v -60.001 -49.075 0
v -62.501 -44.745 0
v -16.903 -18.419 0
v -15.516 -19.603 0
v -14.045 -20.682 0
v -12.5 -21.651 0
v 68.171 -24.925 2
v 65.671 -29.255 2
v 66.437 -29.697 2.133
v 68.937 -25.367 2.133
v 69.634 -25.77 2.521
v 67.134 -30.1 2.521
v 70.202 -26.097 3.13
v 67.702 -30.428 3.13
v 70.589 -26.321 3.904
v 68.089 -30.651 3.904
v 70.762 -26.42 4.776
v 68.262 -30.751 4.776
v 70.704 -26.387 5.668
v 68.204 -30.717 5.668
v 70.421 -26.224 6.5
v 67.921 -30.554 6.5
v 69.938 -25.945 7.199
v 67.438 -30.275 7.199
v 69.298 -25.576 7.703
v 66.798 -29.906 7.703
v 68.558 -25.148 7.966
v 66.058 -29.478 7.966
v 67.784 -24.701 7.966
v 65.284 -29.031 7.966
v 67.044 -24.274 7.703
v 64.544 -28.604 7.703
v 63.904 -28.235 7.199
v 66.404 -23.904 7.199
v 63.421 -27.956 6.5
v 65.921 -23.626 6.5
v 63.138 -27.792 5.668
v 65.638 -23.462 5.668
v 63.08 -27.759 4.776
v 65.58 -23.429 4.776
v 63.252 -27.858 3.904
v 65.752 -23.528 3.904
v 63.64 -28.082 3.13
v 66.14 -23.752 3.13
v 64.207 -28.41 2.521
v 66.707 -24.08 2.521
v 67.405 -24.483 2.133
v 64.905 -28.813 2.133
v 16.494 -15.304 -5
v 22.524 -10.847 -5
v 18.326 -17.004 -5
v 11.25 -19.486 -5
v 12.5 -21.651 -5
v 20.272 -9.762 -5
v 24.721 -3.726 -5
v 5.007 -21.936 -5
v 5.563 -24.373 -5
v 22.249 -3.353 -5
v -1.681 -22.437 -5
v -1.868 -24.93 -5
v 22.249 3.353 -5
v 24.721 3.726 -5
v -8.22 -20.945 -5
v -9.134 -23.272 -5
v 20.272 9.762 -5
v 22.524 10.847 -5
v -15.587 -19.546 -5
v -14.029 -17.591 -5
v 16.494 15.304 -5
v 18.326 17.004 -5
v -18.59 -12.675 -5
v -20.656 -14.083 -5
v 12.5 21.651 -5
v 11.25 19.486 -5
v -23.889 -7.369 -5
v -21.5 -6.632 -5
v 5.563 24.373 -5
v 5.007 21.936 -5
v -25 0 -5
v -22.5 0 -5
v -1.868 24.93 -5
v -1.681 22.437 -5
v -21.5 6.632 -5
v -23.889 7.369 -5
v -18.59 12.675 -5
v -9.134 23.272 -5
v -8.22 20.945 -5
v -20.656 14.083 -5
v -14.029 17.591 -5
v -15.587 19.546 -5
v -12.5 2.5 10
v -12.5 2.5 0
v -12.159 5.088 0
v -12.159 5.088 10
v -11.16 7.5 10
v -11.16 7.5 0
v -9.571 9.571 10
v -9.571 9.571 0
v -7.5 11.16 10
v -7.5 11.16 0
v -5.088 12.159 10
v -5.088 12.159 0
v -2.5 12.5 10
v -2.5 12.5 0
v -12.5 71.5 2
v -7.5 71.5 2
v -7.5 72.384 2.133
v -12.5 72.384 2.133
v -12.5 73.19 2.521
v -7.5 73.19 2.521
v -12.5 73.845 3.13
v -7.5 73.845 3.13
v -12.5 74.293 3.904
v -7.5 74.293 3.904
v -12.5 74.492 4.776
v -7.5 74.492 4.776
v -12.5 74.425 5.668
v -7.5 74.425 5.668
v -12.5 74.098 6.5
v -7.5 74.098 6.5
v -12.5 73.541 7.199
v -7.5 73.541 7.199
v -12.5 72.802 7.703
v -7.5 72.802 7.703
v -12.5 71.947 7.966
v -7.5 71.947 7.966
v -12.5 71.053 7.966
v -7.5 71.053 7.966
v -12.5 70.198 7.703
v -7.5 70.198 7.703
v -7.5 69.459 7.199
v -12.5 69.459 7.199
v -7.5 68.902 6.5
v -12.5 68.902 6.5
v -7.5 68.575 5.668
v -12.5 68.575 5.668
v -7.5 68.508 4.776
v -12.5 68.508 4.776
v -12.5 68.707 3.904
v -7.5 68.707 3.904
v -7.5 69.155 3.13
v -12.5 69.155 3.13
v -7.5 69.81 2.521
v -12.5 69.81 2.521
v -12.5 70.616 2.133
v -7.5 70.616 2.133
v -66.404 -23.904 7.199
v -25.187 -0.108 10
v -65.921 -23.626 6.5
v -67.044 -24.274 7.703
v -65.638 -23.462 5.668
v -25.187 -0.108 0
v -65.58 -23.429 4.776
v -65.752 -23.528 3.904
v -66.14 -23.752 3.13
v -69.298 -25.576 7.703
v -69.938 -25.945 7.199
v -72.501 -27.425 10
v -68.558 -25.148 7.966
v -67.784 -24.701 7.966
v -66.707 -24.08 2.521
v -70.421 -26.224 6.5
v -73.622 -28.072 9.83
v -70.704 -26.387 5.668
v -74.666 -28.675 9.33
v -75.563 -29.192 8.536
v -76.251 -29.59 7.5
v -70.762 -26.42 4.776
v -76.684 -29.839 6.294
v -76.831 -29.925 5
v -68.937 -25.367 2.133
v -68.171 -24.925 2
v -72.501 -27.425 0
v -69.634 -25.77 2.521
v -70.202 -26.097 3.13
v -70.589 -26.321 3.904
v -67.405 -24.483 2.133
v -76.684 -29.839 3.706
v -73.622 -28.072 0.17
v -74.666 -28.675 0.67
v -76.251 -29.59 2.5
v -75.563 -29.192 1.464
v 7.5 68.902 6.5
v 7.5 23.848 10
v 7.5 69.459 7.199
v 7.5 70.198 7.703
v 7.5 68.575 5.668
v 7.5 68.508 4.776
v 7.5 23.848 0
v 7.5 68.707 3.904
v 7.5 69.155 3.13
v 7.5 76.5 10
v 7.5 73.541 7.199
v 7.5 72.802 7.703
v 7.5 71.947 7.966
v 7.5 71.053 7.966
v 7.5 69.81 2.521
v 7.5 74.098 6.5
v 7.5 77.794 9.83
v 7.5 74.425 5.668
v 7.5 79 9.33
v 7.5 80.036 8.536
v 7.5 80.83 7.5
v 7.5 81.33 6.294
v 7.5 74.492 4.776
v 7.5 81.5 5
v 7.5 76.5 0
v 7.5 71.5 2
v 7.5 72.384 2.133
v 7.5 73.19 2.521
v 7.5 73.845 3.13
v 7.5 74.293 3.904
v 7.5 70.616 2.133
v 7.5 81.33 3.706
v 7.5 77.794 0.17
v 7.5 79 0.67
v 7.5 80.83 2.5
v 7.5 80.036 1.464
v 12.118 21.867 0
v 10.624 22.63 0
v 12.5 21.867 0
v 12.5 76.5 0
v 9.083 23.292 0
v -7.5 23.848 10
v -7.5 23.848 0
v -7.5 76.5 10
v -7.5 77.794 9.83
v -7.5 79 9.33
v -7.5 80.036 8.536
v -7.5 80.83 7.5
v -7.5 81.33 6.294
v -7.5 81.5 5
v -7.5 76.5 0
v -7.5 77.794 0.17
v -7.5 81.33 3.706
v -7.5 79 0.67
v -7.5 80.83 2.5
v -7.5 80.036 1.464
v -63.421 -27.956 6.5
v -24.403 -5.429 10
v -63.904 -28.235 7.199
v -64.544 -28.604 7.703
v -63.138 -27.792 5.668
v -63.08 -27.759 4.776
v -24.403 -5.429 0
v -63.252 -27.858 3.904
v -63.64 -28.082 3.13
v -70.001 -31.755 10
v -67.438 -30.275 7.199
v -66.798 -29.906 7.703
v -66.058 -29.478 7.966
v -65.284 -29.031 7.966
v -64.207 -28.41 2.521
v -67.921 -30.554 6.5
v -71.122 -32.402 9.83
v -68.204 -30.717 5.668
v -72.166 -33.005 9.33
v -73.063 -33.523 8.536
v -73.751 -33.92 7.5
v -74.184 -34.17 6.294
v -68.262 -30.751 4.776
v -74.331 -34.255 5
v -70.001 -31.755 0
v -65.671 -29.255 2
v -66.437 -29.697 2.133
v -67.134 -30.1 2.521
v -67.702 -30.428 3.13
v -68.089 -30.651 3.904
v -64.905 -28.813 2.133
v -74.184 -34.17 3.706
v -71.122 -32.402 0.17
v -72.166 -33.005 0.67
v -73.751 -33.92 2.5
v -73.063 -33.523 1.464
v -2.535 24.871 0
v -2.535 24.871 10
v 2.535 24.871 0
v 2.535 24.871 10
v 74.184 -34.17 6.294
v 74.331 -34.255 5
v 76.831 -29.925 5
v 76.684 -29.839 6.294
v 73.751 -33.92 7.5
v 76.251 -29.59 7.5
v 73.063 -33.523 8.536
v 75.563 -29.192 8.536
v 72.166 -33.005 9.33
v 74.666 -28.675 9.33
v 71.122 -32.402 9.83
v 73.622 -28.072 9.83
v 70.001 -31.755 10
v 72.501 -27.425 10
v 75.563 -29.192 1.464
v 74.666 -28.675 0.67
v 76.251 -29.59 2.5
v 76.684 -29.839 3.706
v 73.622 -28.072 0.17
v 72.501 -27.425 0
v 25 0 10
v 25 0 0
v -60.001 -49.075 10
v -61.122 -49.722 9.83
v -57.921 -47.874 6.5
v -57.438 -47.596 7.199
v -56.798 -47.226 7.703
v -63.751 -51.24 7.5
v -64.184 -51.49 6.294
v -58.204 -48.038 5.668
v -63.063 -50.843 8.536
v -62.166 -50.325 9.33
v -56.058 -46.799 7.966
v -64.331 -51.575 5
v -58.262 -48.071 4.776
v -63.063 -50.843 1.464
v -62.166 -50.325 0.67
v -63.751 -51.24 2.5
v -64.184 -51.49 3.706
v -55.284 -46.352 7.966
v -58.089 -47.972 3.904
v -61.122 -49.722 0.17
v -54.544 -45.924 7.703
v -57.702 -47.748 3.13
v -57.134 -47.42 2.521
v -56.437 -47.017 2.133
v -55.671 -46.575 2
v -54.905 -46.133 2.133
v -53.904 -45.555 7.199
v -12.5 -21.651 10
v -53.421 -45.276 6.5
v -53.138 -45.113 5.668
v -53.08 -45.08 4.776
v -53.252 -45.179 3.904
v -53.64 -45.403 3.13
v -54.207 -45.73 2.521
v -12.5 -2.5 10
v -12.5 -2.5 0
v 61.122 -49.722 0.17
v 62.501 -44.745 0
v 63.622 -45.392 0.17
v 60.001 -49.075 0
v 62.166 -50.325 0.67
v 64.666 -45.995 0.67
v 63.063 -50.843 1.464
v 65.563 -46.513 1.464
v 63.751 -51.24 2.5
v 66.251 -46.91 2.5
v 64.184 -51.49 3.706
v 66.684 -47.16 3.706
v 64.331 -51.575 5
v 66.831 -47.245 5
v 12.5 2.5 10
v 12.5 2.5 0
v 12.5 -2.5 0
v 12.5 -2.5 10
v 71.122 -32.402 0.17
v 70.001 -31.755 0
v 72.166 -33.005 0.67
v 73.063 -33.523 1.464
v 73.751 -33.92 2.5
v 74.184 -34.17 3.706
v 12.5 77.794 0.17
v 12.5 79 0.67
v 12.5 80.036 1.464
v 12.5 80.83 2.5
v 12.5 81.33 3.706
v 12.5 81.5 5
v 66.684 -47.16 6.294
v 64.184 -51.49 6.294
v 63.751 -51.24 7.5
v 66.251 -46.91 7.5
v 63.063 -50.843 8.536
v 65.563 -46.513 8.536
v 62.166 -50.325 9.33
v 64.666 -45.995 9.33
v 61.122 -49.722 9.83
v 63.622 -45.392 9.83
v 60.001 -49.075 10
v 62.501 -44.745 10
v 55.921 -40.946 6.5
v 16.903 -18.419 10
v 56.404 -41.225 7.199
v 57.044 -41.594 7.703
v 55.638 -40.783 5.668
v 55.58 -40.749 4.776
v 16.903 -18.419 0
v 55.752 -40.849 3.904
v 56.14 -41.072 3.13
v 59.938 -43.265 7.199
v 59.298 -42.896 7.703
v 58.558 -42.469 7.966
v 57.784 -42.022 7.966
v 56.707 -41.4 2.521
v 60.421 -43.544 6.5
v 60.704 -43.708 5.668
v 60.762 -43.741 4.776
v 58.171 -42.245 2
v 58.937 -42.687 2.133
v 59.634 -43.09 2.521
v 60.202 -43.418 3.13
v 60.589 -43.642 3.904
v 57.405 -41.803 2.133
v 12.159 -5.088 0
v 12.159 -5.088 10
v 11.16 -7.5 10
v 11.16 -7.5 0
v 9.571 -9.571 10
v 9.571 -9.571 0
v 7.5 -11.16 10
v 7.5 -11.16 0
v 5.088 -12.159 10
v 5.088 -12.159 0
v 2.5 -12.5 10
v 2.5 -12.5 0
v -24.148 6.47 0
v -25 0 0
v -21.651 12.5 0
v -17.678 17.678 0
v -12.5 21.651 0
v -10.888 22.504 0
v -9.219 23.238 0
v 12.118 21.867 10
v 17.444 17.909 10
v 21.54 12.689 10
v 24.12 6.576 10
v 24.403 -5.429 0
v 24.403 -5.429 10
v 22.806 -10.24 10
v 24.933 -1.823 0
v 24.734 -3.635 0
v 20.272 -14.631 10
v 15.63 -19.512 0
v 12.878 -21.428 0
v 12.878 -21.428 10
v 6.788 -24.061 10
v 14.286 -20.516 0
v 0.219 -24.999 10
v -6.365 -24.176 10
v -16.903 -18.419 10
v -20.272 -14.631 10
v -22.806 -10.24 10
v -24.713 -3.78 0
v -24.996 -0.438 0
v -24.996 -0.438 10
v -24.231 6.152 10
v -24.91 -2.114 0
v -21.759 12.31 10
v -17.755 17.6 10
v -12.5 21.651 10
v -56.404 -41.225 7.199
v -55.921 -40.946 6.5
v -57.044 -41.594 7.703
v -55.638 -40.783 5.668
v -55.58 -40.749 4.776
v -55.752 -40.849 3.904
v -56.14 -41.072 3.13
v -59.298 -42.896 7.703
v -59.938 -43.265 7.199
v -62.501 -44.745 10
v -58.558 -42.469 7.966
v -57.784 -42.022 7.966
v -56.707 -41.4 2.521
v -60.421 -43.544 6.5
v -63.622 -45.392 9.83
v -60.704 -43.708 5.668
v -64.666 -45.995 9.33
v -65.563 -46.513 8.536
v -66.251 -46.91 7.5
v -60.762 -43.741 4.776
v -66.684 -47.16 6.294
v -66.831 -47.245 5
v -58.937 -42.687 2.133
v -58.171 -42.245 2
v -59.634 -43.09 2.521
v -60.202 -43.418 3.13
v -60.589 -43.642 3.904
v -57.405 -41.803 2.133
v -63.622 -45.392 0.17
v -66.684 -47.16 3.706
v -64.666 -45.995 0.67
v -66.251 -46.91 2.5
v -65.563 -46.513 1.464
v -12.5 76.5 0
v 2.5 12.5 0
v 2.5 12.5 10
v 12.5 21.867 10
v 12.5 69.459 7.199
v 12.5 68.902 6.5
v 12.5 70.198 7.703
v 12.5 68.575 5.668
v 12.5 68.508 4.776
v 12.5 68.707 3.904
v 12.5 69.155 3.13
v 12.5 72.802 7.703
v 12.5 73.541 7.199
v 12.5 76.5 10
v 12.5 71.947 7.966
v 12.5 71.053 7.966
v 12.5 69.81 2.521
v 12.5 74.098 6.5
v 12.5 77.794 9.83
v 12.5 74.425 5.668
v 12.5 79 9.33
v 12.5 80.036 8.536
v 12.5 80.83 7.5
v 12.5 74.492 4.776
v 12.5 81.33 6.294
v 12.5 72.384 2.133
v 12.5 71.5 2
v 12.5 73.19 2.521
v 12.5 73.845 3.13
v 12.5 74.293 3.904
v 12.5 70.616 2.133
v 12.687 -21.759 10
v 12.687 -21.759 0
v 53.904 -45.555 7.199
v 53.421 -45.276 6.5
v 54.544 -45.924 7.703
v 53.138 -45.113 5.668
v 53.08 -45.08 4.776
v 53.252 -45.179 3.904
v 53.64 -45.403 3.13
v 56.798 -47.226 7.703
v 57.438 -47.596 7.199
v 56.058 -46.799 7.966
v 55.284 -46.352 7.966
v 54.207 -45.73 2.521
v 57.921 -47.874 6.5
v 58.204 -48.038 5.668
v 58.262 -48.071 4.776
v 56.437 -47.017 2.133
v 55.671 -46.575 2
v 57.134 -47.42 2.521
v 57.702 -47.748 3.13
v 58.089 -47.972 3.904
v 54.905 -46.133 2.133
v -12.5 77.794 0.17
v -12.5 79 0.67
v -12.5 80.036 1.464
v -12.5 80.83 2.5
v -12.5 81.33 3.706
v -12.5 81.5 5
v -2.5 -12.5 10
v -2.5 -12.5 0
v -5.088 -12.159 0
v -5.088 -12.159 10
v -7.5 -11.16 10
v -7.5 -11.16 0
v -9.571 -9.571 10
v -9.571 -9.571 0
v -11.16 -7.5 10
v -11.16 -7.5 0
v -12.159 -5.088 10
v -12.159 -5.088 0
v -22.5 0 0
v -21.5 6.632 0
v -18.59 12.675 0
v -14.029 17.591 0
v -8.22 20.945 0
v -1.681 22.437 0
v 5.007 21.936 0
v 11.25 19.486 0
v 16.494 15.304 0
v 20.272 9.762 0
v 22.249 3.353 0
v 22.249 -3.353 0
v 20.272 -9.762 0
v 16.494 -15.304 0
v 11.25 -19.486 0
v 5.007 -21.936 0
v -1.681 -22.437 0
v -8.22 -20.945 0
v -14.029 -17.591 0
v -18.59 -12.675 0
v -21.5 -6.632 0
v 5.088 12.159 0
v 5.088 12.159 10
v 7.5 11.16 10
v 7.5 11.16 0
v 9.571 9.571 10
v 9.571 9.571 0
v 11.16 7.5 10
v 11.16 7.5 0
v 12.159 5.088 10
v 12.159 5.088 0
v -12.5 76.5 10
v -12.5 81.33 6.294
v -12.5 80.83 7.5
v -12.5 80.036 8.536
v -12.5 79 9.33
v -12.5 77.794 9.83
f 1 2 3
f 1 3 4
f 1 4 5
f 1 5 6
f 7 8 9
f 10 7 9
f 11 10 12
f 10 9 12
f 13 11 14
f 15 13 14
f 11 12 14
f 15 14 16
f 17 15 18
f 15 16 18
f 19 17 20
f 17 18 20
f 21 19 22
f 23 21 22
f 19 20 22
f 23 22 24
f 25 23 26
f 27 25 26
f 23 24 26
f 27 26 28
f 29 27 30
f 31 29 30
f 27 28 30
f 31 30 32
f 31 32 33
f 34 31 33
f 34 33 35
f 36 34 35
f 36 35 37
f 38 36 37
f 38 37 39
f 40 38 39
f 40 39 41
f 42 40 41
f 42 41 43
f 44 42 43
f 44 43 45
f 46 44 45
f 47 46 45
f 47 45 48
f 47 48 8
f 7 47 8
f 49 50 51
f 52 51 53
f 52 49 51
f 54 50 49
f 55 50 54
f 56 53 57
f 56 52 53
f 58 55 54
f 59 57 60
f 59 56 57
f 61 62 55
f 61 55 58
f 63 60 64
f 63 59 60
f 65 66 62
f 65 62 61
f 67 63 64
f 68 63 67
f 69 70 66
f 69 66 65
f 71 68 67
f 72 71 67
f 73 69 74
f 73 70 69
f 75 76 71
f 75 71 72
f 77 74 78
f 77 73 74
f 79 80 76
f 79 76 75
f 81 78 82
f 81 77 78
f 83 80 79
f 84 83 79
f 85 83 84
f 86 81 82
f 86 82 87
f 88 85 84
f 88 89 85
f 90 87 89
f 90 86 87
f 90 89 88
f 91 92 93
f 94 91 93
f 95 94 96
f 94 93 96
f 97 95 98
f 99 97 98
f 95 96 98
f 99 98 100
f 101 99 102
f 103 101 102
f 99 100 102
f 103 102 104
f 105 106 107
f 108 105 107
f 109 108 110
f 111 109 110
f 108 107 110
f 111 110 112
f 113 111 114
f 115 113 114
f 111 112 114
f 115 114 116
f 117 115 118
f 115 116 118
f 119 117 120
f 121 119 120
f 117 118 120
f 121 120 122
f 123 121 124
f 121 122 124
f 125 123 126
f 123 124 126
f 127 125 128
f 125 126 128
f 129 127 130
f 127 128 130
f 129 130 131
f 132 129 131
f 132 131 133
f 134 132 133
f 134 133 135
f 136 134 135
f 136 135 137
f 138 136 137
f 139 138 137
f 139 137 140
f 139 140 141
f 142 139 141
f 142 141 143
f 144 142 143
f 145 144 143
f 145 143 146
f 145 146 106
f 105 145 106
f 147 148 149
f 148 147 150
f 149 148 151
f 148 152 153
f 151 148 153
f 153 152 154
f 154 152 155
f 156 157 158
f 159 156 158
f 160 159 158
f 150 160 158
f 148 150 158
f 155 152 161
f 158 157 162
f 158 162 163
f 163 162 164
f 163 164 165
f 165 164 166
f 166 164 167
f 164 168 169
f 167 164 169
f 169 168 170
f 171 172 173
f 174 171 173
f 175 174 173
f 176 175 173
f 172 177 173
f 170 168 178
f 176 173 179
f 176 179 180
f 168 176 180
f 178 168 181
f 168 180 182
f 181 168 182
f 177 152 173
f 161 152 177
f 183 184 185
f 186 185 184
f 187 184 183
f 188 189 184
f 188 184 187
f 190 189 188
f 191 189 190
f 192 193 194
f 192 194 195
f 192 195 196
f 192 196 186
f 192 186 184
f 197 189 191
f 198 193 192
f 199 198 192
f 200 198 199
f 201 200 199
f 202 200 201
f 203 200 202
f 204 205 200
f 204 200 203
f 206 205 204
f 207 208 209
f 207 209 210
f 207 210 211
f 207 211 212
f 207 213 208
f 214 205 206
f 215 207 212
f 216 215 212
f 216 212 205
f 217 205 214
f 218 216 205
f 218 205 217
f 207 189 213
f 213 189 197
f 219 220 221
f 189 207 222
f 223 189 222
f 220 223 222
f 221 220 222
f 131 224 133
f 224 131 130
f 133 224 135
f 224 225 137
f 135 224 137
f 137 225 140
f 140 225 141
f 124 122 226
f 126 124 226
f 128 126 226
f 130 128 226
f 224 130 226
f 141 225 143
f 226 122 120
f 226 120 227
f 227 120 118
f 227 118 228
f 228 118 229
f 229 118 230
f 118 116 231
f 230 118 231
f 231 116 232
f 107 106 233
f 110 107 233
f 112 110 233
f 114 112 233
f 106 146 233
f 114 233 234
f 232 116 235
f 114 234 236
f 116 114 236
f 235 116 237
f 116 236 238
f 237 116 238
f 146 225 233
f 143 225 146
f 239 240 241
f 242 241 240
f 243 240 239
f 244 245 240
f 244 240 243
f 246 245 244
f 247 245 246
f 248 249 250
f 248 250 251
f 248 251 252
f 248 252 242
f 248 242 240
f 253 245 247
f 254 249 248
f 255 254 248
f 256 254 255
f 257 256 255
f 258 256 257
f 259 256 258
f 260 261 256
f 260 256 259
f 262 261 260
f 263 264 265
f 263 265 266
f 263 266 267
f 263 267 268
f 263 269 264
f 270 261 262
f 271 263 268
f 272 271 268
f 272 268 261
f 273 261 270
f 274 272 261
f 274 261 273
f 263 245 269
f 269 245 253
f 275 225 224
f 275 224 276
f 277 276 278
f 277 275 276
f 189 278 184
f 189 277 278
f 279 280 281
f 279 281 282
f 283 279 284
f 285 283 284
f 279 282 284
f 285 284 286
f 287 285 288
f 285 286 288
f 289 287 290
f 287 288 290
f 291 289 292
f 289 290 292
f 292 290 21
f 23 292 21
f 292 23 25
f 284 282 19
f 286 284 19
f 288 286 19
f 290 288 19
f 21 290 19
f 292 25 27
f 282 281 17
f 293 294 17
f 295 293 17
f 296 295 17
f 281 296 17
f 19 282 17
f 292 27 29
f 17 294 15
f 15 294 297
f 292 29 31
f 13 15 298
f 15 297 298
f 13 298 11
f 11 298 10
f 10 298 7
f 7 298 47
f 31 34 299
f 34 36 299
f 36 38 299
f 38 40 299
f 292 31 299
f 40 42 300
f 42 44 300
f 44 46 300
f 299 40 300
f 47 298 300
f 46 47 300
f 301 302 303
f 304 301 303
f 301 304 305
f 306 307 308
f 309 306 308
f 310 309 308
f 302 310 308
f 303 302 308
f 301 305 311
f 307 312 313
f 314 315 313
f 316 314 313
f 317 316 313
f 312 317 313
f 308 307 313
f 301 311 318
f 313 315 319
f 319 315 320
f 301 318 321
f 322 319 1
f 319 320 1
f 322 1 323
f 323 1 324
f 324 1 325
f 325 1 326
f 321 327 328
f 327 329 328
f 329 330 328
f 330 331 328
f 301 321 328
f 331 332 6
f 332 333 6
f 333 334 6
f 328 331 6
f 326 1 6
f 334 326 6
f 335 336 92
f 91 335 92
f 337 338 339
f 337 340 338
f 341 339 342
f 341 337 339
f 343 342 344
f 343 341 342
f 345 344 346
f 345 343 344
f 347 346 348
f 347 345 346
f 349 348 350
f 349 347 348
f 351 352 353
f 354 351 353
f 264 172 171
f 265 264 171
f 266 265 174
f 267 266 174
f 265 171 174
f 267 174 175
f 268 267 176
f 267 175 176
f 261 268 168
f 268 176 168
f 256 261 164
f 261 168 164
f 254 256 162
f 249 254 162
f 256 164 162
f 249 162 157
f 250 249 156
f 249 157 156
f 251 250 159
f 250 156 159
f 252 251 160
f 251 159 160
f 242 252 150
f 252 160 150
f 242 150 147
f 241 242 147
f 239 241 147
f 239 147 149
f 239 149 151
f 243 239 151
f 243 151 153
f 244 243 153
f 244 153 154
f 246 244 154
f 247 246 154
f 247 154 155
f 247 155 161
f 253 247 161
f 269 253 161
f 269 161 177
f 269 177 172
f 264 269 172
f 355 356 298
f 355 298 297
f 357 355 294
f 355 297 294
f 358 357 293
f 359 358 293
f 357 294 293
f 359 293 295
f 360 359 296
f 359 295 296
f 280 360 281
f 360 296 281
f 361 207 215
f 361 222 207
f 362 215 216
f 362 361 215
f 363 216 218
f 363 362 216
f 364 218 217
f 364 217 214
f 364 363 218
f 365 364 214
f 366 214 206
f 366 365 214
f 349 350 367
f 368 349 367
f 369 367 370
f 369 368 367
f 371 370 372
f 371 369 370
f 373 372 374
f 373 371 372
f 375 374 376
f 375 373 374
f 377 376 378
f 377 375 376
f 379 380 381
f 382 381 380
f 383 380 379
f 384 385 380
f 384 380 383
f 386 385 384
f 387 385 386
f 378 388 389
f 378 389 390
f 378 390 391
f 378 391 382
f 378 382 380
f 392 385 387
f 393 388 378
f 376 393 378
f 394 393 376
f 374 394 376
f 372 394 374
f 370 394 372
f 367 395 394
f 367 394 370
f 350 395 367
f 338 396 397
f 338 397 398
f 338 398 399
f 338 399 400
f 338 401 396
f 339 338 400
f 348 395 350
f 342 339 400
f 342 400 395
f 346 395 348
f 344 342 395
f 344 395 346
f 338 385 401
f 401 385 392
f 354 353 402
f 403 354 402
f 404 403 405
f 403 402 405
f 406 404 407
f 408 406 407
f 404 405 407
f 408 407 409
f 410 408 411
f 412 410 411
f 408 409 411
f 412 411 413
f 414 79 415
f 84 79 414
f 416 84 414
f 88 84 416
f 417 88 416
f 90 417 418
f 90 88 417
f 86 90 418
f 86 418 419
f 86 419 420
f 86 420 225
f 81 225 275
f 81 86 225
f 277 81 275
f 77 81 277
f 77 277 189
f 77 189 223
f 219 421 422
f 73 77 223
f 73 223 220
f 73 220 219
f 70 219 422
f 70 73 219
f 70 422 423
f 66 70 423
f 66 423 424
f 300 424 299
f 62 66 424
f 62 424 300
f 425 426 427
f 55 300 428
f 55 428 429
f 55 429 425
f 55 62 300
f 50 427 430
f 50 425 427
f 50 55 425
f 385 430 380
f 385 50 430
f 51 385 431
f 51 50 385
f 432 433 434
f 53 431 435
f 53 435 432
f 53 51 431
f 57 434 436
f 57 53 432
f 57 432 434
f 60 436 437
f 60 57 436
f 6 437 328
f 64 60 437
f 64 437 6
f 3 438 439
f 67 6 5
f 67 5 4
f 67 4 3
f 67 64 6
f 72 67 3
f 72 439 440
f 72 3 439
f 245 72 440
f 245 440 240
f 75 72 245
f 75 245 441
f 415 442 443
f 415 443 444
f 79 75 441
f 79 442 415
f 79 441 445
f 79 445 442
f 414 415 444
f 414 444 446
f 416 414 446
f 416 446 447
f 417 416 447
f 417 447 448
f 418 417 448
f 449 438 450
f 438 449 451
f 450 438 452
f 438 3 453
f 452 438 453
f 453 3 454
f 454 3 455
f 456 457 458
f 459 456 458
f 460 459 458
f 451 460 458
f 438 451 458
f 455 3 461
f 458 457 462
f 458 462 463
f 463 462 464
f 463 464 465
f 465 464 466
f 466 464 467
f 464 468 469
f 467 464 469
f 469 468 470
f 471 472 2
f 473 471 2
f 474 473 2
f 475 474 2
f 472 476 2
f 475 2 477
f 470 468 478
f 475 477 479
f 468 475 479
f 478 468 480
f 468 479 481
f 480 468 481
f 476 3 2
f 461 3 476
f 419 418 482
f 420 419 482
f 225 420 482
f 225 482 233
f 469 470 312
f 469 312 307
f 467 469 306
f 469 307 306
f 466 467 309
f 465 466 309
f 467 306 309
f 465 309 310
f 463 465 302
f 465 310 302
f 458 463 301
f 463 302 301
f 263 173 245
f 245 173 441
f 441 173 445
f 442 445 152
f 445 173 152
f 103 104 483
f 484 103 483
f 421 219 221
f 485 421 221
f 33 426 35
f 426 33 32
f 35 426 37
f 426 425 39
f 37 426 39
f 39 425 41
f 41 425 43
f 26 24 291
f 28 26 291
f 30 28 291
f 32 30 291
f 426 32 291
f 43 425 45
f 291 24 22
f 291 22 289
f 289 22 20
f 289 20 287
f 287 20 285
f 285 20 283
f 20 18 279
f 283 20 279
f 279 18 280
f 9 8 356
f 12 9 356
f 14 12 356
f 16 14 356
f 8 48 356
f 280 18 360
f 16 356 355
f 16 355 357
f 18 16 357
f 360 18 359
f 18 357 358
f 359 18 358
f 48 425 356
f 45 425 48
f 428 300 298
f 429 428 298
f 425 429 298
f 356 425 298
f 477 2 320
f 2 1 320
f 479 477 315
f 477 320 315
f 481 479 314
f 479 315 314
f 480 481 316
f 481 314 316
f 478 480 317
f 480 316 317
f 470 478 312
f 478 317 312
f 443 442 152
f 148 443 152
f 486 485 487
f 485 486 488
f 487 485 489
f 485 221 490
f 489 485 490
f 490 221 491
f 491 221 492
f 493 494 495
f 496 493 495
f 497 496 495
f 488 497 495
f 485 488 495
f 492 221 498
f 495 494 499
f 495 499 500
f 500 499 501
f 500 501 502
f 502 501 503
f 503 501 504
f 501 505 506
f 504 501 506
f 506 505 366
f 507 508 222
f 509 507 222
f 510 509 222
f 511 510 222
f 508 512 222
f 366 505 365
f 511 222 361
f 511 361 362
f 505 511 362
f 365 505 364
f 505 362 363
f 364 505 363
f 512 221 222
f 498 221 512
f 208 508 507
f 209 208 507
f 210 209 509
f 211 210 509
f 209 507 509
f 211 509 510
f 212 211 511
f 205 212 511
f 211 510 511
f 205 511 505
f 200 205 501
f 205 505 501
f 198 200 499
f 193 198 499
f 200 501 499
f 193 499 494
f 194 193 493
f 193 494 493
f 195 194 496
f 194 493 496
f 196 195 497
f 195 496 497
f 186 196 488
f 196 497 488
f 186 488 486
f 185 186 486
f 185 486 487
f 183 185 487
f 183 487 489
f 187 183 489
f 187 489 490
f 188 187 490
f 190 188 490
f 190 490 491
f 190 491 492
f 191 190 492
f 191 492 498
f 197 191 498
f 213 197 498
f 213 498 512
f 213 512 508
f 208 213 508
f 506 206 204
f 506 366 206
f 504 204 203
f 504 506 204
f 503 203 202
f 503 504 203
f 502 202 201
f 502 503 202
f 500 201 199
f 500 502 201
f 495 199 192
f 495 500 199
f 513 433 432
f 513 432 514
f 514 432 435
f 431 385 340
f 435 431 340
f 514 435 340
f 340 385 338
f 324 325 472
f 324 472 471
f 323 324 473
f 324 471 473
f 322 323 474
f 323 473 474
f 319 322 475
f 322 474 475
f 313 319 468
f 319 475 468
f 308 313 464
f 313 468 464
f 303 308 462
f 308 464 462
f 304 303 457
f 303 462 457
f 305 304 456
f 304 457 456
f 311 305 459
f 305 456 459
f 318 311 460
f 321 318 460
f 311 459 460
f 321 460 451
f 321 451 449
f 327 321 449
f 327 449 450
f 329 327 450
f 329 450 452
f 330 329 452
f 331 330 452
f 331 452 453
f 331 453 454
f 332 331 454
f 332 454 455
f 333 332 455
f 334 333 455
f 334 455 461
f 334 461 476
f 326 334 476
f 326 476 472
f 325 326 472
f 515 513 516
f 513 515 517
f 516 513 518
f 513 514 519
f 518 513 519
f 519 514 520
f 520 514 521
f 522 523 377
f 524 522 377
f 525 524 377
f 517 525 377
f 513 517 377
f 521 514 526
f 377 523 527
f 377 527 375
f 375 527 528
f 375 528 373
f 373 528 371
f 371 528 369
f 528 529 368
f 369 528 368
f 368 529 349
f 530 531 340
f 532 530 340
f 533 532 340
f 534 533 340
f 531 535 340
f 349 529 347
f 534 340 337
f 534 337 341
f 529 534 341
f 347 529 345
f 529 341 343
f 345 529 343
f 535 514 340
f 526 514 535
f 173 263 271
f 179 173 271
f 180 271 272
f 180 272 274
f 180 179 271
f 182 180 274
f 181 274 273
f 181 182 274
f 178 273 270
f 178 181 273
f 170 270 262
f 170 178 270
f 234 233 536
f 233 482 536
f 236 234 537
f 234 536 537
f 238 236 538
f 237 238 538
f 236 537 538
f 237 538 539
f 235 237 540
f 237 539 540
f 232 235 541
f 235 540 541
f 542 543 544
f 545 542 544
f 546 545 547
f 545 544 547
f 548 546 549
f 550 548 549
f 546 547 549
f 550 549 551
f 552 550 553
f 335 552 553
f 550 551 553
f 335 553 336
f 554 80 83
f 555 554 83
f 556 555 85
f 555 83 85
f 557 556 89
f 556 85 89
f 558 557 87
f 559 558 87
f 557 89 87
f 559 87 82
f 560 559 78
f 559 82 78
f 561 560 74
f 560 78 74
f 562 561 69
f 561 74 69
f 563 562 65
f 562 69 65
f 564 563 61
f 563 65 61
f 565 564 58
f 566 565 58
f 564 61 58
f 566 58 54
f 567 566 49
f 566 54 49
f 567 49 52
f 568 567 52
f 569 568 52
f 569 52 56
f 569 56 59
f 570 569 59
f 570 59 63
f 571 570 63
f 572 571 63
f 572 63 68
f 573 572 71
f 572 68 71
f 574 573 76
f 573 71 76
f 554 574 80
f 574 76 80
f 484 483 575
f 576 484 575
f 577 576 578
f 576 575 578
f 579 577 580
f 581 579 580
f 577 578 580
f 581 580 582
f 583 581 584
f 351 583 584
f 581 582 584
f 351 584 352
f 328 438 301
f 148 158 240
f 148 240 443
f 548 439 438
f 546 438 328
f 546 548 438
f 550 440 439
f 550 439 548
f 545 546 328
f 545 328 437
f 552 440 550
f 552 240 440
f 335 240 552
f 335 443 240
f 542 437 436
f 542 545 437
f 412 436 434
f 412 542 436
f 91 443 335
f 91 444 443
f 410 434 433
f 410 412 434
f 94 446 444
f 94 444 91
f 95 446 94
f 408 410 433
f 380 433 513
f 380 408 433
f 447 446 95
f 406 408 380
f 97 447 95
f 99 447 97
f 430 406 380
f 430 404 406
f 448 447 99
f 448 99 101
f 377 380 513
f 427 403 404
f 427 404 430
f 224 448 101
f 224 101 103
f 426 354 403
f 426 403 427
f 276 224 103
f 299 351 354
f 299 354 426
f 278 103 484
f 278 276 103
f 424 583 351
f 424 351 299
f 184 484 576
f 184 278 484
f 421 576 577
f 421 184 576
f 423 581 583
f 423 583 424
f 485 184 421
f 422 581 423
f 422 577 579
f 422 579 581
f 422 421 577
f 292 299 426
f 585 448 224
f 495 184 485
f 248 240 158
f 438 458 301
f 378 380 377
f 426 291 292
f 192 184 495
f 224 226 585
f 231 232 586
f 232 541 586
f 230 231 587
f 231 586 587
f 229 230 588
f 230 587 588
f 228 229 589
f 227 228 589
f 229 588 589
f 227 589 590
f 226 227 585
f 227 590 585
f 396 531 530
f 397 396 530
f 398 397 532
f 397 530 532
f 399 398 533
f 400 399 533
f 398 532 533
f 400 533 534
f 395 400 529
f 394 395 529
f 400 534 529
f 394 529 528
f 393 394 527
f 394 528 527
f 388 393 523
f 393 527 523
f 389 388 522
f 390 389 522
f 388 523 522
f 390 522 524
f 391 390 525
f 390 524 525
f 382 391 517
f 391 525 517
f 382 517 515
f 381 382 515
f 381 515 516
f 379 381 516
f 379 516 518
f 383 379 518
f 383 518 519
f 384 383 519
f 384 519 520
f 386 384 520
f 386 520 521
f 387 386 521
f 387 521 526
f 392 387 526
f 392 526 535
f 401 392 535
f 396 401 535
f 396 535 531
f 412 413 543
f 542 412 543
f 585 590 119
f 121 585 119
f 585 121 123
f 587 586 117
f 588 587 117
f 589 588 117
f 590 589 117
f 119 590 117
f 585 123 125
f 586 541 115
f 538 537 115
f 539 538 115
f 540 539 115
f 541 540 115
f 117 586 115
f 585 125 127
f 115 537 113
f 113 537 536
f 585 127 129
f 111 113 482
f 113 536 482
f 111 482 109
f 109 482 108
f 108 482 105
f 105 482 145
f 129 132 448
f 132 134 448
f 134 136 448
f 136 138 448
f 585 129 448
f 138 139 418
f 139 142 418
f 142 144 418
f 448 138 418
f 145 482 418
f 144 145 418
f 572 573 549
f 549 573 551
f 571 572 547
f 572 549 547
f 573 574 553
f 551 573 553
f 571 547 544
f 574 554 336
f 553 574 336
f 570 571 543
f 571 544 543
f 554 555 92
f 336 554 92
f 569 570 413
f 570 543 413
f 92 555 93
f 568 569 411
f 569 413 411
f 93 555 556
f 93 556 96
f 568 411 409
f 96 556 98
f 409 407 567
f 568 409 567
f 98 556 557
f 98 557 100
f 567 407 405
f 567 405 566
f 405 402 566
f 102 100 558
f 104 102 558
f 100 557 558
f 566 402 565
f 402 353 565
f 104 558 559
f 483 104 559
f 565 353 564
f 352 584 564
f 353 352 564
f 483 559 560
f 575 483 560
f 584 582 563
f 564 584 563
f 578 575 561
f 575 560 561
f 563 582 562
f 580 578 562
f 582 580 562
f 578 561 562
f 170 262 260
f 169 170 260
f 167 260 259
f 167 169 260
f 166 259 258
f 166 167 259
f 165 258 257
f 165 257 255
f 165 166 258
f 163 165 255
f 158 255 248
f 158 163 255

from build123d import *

# Parameters (mm, degrees)
SKETCH1_R                = 25
BOSS_EXTRUDE1_DEPTH      = 10
BOSS_EXTRUDE3_START      = -10
SKETCH2_W                = 5
SKETCH2_H                = 59.633486872
BOSS_EXTRUDE3_DEPTH      = 10
SKETCH3_R                = 3
CUT_EXTRUDE1_DEPTH       = 29
FILLET1_R                = 5
CIRPATTERN1_COUNT        = 3
FILLET1_OF_CIRPATTERN1_R = 5
BOSS_EXTRUDE5_START      = 5
SKETCH5_R                = 25
SKETCH5_R_2              = 22.5
BOSS_EXTRUDE5_DEPTH      = 5


with BuildPart() as part:
    # Sketch1 → Boss-Extrude1 (new body)
    with BuildSketch(Plane.XY):
        Circle(SKETCH1_R)
        with BuildLine():
            Line((-2.5, 12.5), (2.5, 12.5))
            ThreePointArc((2.5, 12.5), (9.571067812, 9.571067812), (12.5, 2.5))
            Line((12.5, 2.5), (12.5, -2.5))
            ThreePointArc((12.5, -2.5), (9.571067812, -9.571067812), (2.5, -12.5))
            Line((2.5, -12.5), (-2.5, -12.5))
            ThreePointArc((-2.5, -12.5), (-9.571067812, -9.571067812), (-12.5, -2.5))
            Line((-12.5, -2.5), (-12.5, 2.5))
            ThreePointArc((-12.5, 2.5), (-9.571067812, 9.571067812), (-2.5, 12.5))
        make_face(mode=Mode.SUBTRACT)
    extrude(amount=BOSS_EXTRUDE1_DEPTH)

    # Sketch2 → Boss-Extrude3 (add)
    with BuildSketch(Plane.XY.offset(10).offset(BOSS_EXTRUDE3_START)):
        with BuildLine():
            Line((-7.5, 81.5), (-12.5, 81.5))
            Line((-12.5, 81.5), (-12.5, 21.650635095))
            ThreePointArc((-12.5, 21.650635095), (-10.060200326, 22.886510643), (-7.5, 23.848480035))
            Line((-7.5, 23.848480035), (-7.5, 81.5))
        make_face()
        with Locations((10, 51.683256564)):
            Rectangle(SKETCH2_W, SKETCH2_H)
    boss_extrude3 = extrude(amount=BOSS_EXTRUDE3_DEPTH)

    # Sketch3 → Cut-Extrude1 (cut)
    with BuildSketch(Plane(origin=(12.5, 0, 0), x_dir=(0, 0, -1), z_dir=(1, 0, 0))):
        with Locations((-5, 71.5)):
            Circle(SKETCH3_R)
    cut_extrude1 = extrude(amount=-CUT_EXTRUDE1_DEPTH, mode=Mode.SUBTRACT)

    # Fillet1
    fillet1_edges = [part.edges().sort_by_distance(p)[0] for p in [
        (-10, 81.5, 10),
        (-10, 81.5, 0),
        (10, 81.5, 10),
        (10, 81.5, 0),
    ]]
    fillet(fillet1_edges, radius=FILLET1_R - 0.0001)  # a hair under: the kernel refuses the full size

    # CirPattern1: Boss-Extrude3, Cut-Extrude1 ×3 about axis
    cirpattern1_axis = Axis((0, 0, 0), (0, 0, 1))
    add([boss_extrude3.rotate(cirpattern1_axis, i * 360 / CIRPATTERN1_COUNT) for i in range(1, CIRPATTERN1_COUNT)])
    add([cut_extrude1.rotate(cirpattern1_axis, i * 360 / CIRPATTERN1_COUNT) for i in range(1, CIRPATTERN1_COUNT)], mode=Mode.SUBTRACT)

    # Fillet1 of CirPattern1
    fillet1_of_cirpattern1_edges = [part.edges().sort_by_distance(p)[0] for p in [
        (-65.581070408, -49.410254038, 10),
        (-65.581070408, -49.410254038, 0),
        (-75.581070408, -32.089745962, 10),
        (-75.581070408, -32.089745962, 0),
        (75.581070408, -32.089745962, 10),
        (75.581070408, -32.089745962, 0),
        (65.581070408, -49.410254038, 10),
        (65.581070408, -49.410254038, 0),
    ]]
    fillet(fillet1_of_cirpattern1_edges, radius=FILLET1_OF_CIRPATTERN1_R - 0.0001)  # a hair under: the kernel refuses the full size

    # Sketch5 → Boss-Extrude5 (add)
    with BuildSketch(Plane(origin=(0, 0, 0), x_dir=(-1, 0, 0), z_dir=(0, 0, -1)).offset(BOSS_EXTRUDE5_START)):
        Circle(SKETCH5_R)
        Circle(SKETCH5_R_2, mode=Mode.SUBTRACT)
    extrude(amount=-BOSS_EXTRUDE5_DEPTH)


solid = part.part
